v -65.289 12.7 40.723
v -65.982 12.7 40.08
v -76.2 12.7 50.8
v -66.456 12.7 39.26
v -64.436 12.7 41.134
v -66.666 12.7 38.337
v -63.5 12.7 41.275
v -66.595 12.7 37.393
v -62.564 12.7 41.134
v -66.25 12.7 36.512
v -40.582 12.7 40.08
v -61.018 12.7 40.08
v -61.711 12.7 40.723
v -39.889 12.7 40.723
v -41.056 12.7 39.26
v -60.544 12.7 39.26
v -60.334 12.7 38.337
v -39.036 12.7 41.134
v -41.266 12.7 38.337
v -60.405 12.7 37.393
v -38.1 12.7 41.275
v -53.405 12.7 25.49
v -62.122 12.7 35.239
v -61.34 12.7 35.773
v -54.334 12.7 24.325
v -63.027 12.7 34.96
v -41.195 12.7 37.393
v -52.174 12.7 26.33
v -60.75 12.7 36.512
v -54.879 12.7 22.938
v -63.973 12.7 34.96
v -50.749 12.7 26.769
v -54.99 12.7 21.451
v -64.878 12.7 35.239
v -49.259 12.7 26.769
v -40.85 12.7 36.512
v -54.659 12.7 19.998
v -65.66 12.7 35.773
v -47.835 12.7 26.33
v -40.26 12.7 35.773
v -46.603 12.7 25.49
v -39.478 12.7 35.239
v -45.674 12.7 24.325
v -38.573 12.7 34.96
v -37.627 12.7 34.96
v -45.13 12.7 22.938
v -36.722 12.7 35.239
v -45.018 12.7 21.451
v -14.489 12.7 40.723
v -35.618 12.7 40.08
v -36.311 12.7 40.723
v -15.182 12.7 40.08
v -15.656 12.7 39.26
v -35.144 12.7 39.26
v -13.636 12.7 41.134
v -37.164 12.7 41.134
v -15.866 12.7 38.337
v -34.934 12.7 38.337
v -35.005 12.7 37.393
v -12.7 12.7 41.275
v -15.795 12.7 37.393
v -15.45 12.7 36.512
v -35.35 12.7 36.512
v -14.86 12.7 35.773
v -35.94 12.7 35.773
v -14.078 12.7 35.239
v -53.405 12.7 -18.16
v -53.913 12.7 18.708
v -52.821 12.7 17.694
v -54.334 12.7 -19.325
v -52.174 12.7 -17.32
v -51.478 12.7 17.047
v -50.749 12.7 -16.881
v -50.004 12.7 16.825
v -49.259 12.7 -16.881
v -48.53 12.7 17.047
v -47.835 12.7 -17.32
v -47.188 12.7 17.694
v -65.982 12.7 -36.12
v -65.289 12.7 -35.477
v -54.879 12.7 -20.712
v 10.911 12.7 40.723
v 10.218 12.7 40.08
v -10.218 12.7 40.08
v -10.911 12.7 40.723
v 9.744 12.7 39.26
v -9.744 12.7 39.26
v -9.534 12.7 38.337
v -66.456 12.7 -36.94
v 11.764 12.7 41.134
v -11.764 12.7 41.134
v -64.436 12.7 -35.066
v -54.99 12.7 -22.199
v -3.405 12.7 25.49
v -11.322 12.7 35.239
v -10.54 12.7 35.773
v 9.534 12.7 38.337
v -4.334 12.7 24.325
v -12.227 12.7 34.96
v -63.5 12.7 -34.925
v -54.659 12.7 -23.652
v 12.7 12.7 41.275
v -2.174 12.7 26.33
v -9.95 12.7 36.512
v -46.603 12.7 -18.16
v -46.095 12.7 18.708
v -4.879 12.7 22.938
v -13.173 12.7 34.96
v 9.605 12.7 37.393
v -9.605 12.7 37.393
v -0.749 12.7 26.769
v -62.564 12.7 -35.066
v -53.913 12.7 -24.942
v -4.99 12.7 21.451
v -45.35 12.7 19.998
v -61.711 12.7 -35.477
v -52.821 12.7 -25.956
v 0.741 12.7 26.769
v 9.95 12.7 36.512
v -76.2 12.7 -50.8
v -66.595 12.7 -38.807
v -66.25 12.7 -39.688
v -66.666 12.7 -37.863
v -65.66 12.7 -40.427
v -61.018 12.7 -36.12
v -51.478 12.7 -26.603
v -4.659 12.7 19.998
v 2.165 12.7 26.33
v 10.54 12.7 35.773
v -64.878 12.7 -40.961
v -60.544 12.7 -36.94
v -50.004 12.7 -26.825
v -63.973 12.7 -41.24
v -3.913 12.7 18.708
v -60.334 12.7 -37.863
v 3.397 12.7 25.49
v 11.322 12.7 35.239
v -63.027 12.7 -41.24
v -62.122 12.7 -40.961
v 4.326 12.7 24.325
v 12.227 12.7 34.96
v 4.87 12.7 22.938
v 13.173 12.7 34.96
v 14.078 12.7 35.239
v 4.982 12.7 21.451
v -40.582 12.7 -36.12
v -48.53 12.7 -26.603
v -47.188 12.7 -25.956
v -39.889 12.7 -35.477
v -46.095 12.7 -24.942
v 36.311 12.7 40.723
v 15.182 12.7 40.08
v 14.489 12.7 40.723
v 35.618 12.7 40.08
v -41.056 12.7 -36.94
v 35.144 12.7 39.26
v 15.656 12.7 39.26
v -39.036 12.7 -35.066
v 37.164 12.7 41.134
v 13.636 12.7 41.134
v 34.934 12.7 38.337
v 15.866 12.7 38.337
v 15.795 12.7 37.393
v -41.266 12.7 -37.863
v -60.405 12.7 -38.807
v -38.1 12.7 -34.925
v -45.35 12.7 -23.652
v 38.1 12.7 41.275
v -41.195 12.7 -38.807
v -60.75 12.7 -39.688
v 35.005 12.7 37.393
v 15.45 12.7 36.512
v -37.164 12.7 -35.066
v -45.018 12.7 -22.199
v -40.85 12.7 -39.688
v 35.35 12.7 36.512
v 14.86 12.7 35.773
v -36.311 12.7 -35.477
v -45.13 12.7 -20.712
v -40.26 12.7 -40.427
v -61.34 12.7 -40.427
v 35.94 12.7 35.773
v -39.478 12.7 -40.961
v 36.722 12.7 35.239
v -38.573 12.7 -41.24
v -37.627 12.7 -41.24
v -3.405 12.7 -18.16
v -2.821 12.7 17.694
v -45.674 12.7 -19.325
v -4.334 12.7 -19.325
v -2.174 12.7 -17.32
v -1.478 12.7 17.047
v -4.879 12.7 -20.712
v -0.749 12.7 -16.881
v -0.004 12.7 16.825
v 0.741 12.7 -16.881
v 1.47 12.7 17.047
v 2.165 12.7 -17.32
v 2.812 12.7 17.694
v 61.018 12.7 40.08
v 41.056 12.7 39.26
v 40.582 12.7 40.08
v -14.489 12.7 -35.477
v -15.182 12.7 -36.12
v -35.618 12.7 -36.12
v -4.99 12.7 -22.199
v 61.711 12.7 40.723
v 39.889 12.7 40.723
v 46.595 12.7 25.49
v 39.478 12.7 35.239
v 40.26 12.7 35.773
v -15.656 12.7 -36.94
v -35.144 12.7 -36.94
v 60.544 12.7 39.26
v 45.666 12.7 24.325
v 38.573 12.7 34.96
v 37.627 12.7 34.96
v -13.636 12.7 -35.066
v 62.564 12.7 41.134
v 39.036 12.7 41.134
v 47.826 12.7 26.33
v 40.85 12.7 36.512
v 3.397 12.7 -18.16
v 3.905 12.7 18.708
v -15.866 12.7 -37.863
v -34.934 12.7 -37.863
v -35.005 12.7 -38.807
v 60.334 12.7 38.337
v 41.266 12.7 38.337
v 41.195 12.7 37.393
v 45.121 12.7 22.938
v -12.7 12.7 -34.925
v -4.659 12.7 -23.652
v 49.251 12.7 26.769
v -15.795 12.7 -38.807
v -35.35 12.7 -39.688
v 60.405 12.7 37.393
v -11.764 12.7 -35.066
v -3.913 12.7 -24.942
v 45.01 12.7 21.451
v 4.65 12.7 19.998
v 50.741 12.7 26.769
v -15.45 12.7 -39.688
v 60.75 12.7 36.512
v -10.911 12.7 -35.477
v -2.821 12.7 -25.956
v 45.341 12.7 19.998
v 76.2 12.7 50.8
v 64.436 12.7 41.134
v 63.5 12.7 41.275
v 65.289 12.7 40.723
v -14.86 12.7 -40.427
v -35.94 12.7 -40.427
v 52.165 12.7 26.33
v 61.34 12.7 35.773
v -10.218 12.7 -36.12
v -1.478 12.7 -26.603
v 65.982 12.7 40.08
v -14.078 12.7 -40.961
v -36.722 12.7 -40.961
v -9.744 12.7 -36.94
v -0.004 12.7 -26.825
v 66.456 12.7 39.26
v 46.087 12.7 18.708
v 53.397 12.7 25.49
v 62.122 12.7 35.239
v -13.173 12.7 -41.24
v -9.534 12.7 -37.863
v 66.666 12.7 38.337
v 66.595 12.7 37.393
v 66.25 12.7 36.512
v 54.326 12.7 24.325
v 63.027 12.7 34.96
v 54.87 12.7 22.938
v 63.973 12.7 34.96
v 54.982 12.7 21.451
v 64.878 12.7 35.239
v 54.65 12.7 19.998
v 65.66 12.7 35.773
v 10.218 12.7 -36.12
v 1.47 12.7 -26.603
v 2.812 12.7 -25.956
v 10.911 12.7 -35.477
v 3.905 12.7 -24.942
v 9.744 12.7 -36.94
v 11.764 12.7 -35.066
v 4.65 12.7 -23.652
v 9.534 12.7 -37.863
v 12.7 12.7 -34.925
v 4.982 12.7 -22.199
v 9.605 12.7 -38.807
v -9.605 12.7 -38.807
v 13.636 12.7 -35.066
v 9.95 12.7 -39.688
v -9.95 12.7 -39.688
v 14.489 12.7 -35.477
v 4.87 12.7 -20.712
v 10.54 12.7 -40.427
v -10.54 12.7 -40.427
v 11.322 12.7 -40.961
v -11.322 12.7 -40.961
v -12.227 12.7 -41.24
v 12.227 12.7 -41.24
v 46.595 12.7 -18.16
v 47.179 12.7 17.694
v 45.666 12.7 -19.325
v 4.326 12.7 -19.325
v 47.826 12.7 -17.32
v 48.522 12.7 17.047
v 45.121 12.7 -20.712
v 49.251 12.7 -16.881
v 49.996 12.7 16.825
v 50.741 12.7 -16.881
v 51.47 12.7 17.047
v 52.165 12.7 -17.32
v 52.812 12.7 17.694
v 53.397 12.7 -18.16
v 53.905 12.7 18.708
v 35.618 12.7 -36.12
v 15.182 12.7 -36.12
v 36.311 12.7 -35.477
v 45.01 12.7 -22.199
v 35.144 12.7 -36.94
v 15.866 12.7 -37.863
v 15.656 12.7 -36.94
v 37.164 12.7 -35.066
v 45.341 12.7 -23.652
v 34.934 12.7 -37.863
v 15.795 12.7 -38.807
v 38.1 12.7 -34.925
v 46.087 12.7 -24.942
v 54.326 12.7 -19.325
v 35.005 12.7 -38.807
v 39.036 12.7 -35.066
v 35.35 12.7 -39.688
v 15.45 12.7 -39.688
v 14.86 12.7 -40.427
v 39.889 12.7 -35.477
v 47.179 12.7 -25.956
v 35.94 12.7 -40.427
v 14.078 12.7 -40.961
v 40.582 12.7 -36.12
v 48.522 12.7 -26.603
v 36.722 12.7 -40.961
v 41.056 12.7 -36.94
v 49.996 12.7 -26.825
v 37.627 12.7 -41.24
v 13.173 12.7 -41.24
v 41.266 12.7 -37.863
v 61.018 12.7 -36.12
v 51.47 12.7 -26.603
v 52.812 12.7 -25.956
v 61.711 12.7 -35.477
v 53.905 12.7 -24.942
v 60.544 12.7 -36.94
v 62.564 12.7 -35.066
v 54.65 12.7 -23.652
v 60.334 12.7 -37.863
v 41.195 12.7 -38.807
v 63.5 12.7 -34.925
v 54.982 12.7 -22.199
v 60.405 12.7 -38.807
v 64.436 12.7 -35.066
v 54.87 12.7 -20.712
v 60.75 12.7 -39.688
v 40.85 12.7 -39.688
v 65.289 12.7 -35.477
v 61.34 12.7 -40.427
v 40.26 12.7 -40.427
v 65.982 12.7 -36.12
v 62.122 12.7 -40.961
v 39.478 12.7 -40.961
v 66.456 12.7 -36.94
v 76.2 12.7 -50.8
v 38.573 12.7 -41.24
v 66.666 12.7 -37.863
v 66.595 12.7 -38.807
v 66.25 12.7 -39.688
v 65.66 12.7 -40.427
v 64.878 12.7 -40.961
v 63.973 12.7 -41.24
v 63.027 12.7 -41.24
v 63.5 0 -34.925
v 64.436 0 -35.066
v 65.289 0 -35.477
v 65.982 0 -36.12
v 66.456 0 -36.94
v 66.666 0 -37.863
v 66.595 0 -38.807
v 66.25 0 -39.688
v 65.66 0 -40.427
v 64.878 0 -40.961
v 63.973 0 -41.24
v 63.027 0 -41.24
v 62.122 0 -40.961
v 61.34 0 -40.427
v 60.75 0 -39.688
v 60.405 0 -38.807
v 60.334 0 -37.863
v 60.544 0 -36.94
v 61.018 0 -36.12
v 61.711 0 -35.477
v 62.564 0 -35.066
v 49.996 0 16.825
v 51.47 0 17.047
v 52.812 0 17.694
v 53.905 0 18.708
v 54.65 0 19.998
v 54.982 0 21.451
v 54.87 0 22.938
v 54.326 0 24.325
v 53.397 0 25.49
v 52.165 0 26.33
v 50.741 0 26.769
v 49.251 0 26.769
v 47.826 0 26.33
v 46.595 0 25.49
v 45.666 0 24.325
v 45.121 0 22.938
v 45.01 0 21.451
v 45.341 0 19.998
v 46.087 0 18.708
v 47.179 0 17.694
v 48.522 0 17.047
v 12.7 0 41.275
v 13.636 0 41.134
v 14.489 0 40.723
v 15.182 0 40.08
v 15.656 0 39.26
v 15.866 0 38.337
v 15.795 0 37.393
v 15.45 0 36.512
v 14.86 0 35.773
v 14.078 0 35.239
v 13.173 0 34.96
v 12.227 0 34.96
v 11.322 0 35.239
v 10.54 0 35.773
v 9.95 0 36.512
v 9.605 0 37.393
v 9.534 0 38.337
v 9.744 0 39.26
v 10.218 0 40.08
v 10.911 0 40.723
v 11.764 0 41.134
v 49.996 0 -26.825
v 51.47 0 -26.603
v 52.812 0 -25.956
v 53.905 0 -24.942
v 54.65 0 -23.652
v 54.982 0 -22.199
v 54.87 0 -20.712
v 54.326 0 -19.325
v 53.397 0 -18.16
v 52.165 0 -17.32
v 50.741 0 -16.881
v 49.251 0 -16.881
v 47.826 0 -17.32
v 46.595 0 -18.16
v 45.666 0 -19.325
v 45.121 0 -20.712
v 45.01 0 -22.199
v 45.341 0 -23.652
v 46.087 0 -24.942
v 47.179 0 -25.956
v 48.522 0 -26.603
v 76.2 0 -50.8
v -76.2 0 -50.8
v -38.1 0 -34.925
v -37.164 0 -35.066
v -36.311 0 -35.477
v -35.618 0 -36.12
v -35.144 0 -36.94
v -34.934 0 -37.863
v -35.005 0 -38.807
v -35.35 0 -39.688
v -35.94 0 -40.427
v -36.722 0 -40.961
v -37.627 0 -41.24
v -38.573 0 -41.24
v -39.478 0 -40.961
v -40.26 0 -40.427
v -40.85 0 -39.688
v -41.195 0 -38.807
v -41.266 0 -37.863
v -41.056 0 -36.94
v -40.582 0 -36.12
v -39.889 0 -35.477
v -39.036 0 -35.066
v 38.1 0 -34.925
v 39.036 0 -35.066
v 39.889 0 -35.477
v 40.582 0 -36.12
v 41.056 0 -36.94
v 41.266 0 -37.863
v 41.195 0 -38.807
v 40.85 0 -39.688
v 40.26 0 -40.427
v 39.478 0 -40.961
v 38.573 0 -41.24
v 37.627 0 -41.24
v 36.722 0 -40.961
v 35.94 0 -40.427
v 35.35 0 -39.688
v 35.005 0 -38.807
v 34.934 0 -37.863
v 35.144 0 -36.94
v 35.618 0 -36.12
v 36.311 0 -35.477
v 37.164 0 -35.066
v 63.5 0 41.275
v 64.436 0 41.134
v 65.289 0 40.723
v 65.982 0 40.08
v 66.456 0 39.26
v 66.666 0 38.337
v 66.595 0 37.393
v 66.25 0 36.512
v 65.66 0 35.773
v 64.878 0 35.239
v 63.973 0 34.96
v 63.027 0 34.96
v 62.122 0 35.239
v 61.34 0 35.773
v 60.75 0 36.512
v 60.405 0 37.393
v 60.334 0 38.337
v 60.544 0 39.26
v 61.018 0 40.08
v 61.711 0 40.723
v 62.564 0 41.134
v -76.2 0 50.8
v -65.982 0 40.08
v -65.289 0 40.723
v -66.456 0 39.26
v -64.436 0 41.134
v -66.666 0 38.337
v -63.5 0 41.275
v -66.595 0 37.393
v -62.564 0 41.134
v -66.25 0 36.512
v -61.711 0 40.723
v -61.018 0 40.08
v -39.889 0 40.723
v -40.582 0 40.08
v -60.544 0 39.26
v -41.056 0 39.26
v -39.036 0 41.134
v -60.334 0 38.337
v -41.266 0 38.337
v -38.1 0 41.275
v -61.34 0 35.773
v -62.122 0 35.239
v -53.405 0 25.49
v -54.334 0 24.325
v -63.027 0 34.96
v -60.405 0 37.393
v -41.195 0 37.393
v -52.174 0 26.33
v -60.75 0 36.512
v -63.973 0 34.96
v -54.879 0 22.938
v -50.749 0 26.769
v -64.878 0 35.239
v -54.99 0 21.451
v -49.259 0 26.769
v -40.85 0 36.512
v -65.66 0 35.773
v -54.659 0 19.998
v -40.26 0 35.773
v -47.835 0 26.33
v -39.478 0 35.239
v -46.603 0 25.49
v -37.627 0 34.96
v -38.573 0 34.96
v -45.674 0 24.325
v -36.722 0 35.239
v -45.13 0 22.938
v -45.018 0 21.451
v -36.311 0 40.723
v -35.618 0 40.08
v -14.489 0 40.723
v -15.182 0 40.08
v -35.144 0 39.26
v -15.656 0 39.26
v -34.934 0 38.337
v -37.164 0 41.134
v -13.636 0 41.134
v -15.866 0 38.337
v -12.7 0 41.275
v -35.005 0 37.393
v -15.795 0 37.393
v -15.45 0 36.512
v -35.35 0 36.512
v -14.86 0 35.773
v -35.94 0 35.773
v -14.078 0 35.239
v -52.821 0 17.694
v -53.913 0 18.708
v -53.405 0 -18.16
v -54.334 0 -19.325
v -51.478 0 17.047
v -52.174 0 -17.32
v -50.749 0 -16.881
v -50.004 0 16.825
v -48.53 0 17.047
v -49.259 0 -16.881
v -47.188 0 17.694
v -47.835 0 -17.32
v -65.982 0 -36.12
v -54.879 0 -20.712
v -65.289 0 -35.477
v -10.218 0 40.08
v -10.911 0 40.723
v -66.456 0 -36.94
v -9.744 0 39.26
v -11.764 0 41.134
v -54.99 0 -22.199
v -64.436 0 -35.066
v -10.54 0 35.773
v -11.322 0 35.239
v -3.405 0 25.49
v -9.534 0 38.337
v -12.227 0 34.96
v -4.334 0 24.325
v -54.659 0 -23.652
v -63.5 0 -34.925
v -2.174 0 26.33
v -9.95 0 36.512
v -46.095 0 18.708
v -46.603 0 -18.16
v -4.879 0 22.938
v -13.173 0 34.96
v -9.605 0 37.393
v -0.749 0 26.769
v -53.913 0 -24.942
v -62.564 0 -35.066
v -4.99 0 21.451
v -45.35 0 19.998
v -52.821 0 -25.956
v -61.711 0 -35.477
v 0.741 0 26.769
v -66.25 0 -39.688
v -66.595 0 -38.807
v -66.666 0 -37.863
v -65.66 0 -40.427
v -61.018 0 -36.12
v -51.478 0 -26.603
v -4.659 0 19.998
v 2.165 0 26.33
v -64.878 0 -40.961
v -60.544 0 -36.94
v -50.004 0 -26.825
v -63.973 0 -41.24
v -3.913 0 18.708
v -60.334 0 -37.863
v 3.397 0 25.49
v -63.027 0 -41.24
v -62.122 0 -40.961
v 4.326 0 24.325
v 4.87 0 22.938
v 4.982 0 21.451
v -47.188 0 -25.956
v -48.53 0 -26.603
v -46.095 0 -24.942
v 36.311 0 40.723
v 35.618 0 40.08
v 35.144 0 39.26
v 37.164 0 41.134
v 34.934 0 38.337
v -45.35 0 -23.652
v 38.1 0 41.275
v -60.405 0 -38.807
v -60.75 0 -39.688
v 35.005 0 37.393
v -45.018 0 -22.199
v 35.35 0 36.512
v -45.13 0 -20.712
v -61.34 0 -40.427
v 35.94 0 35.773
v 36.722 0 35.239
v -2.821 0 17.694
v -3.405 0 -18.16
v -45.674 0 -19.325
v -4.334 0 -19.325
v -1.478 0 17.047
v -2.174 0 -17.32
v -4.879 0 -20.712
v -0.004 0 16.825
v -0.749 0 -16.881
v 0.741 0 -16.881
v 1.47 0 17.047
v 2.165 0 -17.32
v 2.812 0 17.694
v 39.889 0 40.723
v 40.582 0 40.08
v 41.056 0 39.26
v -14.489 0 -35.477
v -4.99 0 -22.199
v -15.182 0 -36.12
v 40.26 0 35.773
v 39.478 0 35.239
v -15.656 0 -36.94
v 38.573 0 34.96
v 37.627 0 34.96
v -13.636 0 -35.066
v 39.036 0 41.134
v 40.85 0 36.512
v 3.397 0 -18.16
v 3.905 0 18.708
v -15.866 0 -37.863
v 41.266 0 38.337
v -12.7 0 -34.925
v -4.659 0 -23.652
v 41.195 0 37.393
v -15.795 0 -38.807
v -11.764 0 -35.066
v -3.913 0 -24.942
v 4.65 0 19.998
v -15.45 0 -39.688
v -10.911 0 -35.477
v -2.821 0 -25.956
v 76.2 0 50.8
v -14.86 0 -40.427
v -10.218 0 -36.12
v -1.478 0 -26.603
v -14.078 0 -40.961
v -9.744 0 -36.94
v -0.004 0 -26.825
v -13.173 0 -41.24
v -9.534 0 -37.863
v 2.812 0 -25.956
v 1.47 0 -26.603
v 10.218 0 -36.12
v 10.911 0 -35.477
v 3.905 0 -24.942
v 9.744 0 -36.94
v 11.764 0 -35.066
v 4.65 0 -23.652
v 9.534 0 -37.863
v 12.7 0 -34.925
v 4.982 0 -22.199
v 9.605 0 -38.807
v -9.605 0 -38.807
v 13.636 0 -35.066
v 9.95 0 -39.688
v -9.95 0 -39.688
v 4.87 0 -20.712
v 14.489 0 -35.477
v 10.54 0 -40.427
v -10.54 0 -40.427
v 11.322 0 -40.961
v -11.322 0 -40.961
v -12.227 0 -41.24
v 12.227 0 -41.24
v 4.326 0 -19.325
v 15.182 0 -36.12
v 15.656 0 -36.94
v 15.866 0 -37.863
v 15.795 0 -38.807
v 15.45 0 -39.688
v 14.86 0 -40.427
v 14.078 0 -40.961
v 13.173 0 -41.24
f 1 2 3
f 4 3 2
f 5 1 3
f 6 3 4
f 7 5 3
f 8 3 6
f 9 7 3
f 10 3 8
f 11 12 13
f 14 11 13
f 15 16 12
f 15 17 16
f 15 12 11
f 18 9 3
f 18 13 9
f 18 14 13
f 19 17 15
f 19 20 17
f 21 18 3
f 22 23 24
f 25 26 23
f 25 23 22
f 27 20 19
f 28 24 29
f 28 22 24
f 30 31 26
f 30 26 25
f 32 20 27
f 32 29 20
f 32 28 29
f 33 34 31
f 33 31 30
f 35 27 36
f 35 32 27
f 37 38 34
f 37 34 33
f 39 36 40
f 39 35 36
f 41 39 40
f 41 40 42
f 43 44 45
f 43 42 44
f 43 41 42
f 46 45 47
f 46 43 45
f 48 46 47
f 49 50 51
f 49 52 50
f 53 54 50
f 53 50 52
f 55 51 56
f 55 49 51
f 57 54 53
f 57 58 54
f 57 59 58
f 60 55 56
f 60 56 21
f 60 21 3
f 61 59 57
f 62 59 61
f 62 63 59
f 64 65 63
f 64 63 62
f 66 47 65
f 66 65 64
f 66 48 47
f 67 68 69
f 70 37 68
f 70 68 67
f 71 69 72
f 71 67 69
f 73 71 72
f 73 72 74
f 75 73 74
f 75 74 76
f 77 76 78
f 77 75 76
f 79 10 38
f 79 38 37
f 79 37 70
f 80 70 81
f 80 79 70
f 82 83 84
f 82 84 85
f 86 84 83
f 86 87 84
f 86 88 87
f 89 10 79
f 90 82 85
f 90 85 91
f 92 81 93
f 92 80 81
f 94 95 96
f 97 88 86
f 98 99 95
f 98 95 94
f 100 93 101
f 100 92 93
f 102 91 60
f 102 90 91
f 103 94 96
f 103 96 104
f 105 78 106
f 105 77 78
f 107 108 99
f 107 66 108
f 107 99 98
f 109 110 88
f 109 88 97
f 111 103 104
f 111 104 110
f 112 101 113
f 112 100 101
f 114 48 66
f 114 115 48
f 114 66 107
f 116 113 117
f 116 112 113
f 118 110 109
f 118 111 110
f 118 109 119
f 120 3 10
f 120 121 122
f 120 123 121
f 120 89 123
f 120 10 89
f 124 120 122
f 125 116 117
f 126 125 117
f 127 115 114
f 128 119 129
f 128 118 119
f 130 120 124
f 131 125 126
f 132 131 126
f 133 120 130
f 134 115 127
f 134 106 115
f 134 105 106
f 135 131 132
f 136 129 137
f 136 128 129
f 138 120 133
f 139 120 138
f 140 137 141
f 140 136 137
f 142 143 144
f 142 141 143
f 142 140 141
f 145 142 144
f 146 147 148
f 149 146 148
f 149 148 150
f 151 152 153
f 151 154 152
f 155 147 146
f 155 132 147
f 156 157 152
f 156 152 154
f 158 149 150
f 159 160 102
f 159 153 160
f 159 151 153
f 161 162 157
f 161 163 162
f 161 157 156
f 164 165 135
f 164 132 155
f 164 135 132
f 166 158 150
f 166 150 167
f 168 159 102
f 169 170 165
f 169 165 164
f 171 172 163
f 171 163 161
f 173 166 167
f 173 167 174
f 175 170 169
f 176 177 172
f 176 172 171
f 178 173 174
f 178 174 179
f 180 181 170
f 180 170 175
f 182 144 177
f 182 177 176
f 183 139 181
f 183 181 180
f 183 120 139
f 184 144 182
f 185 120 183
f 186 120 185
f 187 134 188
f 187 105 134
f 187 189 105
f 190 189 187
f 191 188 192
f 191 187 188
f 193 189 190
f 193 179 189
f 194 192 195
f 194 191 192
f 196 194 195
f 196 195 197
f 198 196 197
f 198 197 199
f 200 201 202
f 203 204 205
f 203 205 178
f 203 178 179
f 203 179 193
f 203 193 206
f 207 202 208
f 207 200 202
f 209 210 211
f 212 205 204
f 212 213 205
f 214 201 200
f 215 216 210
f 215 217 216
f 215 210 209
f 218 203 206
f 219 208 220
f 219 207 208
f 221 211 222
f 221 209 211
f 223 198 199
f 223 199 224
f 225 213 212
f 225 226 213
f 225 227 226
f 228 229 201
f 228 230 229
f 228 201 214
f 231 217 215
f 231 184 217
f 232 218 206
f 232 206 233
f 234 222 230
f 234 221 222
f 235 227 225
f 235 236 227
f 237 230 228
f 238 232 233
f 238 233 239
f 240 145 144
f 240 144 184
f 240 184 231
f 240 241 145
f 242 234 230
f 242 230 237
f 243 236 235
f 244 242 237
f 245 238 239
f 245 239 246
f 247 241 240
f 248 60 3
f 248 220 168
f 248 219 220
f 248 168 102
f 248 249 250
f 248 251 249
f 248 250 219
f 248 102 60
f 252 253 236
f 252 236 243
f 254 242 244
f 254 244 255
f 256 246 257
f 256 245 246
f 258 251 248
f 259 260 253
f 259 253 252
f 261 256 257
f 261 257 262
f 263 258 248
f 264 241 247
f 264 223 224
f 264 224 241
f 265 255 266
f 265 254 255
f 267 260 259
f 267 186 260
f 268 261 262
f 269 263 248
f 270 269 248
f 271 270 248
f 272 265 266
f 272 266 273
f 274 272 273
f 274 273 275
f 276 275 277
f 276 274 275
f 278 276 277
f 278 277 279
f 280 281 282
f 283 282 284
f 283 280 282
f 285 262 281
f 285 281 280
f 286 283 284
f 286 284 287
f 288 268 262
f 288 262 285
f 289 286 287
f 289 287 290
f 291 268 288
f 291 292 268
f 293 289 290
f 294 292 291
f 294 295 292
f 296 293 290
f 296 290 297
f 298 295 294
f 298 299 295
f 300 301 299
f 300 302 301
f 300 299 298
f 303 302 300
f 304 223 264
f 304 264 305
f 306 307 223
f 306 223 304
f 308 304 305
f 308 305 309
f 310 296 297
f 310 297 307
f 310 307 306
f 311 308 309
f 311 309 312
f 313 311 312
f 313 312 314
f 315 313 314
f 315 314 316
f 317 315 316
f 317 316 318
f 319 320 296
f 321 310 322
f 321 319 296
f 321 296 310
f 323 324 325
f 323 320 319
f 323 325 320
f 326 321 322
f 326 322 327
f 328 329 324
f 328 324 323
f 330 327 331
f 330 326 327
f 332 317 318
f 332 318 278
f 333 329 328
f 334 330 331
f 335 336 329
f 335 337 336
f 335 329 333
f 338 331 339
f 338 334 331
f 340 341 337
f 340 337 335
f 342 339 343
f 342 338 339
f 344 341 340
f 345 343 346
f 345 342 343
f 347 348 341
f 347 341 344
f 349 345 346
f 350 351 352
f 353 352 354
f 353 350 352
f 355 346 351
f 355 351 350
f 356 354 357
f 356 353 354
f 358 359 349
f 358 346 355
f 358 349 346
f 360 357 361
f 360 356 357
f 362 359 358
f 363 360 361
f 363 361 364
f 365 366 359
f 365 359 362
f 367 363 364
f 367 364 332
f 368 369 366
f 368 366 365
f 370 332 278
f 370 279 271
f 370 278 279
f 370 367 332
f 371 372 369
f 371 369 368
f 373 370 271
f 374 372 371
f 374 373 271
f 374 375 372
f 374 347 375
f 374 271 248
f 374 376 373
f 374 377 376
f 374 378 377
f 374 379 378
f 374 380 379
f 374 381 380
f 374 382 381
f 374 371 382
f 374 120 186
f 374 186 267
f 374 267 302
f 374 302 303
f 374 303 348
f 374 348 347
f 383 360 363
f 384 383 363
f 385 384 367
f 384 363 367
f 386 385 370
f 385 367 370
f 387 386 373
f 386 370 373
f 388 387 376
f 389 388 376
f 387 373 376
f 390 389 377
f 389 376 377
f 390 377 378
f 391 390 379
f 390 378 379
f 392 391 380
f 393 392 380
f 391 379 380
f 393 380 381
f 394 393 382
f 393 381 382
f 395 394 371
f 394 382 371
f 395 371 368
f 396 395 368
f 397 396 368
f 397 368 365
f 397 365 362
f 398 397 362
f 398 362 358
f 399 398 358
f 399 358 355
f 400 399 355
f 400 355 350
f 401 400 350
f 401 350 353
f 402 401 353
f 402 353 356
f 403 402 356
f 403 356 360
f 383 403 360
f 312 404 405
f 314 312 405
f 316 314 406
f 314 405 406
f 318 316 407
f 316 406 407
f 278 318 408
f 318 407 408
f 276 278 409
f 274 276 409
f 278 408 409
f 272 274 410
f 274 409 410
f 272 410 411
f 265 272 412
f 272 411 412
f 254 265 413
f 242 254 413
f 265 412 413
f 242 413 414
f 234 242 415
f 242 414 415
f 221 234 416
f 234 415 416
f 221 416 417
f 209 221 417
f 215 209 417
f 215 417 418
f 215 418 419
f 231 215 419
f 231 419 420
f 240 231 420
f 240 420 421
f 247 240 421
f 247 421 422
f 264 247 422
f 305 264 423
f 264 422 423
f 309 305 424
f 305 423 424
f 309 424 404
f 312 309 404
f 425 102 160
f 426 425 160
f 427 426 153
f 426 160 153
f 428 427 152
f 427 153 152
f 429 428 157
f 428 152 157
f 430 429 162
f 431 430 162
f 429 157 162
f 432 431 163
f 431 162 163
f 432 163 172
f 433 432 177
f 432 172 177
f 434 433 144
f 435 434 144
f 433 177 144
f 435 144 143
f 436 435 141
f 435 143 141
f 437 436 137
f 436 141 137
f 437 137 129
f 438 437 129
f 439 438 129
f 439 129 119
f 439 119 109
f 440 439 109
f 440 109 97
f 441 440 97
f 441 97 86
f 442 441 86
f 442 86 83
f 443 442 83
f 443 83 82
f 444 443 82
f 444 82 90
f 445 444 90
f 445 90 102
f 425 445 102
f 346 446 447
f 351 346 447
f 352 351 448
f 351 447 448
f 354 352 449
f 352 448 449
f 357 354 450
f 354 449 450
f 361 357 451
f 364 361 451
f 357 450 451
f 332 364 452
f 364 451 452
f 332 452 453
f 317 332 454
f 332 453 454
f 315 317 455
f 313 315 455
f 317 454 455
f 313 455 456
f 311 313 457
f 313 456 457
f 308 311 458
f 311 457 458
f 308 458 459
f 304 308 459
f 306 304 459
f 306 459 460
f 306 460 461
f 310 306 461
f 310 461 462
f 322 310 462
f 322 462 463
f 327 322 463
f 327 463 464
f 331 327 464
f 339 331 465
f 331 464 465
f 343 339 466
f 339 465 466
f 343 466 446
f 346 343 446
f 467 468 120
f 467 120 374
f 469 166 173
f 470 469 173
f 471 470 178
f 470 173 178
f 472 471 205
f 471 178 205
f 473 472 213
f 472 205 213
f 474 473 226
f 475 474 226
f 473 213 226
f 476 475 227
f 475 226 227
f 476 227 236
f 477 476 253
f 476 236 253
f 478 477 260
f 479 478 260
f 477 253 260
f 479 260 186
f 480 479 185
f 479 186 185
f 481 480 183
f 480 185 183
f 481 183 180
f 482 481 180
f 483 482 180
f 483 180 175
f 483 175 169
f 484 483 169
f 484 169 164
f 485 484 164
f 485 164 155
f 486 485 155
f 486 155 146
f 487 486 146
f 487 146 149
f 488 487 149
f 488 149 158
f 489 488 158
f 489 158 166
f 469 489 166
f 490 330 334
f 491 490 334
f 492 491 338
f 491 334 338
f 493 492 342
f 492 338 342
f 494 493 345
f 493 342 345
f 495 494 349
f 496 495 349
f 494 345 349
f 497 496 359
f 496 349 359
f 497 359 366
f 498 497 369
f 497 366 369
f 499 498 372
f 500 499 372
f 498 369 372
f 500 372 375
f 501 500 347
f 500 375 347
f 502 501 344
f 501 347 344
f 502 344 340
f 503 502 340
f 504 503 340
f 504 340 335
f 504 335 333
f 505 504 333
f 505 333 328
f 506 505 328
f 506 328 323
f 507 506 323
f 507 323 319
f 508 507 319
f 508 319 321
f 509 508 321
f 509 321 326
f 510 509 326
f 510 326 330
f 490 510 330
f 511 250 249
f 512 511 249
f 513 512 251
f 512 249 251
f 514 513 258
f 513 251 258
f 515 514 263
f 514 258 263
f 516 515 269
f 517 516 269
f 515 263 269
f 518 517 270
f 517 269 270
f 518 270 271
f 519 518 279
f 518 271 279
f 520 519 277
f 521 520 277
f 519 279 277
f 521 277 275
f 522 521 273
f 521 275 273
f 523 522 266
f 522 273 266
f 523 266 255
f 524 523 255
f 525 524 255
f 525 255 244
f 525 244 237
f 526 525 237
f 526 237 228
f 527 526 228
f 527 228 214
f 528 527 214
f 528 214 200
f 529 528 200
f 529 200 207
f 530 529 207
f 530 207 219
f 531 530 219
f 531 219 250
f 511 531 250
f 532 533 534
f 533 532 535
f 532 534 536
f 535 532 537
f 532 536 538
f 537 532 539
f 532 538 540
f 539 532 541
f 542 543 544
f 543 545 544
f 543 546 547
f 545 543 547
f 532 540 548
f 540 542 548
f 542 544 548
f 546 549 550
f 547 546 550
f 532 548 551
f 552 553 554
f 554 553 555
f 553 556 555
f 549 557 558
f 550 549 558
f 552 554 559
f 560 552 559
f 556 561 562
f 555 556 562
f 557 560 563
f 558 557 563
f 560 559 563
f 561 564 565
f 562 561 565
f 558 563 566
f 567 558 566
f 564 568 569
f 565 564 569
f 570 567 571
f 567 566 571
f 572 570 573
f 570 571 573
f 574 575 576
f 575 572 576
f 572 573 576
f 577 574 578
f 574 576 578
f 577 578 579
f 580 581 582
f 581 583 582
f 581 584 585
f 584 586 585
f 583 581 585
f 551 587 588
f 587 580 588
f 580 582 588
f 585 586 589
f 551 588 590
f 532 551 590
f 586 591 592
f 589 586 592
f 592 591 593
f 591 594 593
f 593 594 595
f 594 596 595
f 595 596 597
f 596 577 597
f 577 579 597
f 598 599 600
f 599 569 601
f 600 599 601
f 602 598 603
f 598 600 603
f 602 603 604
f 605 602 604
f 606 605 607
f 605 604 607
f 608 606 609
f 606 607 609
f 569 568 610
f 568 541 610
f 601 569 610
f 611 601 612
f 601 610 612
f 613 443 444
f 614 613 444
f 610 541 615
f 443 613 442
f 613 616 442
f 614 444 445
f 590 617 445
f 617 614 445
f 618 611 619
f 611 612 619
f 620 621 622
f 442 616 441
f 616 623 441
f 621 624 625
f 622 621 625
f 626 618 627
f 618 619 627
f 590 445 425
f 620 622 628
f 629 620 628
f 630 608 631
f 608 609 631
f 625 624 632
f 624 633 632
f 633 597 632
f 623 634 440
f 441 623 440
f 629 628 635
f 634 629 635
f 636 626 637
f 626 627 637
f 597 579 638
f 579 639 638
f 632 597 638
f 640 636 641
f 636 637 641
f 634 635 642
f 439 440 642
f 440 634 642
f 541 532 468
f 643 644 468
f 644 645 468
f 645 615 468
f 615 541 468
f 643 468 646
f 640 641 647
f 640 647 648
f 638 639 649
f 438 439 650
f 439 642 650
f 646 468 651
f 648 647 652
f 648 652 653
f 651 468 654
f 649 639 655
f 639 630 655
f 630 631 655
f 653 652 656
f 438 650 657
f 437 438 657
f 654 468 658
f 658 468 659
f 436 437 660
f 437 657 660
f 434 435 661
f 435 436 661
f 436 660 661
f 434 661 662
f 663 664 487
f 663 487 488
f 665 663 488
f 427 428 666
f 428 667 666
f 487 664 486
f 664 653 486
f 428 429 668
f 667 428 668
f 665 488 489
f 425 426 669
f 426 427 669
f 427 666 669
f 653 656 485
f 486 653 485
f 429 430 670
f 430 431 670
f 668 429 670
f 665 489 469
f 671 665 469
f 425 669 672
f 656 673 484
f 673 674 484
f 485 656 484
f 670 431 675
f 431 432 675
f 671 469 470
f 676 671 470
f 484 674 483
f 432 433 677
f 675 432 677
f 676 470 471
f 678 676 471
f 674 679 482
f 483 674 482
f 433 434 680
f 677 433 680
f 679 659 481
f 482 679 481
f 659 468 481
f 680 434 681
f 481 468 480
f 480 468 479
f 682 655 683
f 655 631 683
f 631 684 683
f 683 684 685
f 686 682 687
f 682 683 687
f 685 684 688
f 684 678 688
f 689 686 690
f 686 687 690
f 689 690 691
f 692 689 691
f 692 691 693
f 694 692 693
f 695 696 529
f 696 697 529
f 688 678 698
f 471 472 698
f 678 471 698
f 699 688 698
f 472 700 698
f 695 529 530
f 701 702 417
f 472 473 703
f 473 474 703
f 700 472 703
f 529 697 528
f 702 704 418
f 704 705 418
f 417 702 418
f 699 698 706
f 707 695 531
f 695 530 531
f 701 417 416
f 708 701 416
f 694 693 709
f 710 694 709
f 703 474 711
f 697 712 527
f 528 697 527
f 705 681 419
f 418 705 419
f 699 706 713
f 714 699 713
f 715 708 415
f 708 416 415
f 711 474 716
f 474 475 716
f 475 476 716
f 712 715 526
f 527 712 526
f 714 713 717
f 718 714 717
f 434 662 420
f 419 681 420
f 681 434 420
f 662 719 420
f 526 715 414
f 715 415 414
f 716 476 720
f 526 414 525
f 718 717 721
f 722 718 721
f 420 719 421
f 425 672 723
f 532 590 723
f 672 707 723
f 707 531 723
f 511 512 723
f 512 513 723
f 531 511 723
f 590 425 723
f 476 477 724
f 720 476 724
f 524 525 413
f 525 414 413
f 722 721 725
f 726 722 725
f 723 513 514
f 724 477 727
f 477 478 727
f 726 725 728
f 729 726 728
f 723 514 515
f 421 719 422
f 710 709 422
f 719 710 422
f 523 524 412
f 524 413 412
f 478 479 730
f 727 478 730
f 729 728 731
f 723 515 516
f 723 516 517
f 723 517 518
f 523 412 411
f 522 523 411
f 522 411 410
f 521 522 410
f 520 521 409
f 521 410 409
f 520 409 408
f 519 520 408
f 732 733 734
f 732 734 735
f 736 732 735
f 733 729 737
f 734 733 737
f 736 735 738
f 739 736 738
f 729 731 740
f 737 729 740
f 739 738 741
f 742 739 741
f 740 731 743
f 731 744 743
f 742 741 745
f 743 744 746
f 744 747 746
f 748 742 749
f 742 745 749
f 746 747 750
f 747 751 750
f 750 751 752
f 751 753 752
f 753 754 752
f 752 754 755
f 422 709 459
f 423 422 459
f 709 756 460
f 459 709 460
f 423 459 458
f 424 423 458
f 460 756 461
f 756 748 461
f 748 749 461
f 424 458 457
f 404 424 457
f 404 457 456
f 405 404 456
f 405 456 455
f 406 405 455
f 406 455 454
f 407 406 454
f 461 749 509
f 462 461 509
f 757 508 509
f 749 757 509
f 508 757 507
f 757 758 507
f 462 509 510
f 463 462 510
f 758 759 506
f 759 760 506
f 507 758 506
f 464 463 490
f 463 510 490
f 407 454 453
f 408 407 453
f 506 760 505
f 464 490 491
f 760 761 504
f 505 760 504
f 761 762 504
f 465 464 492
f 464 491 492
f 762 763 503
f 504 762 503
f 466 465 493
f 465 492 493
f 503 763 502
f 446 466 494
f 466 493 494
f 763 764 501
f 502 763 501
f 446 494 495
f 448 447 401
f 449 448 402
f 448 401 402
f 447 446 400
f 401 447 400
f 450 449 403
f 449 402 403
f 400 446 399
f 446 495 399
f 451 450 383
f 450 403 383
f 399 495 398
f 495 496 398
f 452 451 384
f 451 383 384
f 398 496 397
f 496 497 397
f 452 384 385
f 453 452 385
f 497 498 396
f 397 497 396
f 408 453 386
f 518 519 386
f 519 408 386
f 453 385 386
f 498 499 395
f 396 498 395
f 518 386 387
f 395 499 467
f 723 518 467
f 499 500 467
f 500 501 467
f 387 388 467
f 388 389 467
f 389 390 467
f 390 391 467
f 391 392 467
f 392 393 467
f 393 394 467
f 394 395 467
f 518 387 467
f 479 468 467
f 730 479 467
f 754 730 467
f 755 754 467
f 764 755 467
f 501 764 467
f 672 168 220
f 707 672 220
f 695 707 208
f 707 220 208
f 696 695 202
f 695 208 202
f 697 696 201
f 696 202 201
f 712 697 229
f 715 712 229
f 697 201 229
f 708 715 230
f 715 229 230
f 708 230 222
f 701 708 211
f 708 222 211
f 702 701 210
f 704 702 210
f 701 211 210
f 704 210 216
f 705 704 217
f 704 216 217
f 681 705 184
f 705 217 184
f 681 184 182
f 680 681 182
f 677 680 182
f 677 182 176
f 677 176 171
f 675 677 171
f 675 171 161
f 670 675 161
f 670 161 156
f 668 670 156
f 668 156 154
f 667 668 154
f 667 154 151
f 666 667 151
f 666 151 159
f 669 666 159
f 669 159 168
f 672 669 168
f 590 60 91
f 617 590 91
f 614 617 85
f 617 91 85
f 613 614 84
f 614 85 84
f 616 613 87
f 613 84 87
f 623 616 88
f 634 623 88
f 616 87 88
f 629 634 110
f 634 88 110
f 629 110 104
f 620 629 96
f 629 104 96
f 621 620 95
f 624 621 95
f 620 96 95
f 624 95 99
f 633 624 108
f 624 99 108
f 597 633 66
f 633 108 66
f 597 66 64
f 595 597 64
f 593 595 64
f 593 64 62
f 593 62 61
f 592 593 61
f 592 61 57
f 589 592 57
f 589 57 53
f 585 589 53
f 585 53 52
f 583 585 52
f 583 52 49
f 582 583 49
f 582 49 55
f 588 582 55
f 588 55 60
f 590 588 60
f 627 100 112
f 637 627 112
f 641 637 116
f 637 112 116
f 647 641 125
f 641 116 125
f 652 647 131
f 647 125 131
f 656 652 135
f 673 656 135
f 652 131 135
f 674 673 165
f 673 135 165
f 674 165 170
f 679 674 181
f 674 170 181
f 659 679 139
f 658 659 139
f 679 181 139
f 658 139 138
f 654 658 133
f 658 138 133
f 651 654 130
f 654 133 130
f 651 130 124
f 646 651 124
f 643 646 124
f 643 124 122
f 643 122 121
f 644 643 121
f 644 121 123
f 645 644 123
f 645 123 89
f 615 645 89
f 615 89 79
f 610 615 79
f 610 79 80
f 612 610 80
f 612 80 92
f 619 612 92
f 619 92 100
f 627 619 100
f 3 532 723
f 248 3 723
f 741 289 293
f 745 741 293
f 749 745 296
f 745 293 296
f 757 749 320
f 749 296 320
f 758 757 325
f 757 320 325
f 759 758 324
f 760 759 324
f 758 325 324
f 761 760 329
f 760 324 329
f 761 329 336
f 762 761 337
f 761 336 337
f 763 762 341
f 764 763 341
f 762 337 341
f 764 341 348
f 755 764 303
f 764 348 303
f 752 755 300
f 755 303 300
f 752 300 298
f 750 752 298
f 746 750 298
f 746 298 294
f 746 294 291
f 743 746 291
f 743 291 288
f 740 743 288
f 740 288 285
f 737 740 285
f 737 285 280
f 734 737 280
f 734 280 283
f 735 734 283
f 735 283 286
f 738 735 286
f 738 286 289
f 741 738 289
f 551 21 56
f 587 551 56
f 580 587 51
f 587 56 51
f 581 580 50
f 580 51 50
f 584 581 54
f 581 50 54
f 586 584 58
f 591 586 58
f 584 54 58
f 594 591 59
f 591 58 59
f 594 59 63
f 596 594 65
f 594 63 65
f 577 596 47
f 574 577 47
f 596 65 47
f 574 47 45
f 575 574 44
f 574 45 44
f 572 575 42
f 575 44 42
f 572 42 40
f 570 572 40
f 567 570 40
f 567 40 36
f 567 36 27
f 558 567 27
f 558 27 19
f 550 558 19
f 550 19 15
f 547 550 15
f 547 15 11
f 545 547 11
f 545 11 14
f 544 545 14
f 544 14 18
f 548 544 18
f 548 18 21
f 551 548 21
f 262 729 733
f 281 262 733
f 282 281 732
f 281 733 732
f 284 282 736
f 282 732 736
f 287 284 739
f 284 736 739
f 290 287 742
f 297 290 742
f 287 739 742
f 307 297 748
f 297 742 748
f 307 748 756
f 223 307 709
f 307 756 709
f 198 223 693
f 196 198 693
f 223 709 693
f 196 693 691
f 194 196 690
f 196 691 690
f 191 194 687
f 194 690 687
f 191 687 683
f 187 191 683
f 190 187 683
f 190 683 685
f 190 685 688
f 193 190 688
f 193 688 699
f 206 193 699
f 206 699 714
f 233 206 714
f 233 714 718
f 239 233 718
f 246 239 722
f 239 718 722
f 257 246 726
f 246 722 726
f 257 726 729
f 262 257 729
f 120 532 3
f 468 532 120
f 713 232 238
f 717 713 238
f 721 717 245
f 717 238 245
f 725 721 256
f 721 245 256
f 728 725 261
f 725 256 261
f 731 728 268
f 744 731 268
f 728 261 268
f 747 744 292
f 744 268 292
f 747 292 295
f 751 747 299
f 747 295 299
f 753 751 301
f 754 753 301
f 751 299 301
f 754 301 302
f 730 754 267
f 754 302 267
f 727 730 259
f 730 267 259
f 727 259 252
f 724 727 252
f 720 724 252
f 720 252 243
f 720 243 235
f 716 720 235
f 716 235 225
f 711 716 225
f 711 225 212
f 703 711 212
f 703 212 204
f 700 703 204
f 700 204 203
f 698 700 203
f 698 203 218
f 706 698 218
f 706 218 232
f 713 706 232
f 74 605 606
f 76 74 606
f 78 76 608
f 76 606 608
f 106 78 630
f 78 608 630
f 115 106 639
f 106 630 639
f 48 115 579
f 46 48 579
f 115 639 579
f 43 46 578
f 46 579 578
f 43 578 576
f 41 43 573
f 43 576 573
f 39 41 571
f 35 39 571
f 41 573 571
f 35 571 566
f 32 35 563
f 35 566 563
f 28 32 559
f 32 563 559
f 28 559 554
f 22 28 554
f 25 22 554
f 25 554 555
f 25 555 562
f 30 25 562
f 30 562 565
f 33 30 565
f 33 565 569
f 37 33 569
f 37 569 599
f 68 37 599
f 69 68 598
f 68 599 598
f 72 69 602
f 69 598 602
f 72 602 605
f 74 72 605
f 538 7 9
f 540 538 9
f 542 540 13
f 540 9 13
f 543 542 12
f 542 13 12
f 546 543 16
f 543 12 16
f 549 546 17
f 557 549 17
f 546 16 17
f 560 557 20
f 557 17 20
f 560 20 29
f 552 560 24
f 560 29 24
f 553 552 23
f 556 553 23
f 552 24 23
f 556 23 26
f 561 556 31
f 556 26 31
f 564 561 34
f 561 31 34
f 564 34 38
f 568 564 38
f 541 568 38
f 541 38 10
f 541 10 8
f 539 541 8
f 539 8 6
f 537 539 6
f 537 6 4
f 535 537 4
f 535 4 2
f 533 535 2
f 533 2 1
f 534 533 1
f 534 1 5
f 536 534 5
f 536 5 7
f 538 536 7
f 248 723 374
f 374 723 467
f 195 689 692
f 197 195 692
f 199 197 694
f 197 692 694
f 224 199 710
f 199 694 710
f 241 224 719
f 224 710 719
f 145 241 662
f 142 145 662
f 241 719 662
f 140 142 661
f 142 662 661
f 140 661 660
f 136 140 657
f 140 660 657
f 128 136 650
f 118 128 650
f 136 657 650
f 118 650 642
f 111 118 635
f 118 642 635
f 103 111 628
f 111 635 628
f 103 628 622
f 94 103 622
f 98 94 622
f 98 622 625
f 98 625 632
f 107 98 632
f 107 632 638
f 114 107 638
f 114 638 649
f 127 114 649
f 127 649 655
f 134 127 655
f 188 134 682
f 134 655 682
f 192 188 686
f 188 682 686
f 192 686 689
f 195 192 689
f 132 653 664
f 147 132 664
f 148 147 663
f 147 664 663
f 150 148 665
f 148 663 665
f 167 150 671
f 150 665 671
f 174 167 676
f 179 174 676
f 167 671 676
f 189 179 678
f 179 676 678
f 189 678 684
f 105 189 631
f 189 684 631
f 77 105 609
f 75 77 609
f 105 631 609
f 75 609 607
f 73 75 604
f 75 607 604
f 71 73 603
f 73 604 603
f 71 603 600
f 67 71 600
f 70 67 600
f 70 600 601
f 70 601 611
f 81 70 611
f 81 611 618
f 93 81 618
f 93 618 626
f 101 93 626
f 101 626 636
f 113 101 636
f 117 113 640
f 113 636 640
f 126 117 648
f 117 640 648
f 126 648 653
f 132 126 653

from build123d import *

# Parameters (mm, degrees)
SKETCH1_W           = 152.4
SKETCH1_H           = 101.6
BOSS_EXTRUDE1_DEPTH = 12.7
SKETCH2_R           = 5
CUT_EXTRUDE1_DEPTH  = 12.7
SKETCH3_R           = 3.175
CUT_EXTRUDE2_DEPTH  = 93.457395594


with BuildPart() as part:
    # Sketch1 → Boss-Extrude1 (new body)
    with BuildSketch(Plane(origin=(0, 0, 0), x_dir=(1, 0, 0), z_dir=(0, 1, 0))):
        Rectangle(SKETCH1_W, SKETCH1_H)
    extrude(amount=BOSS_EXTRUDE1_DEPTH)

    # Sketch2 → Cut-Extrude1 (cut)
    with BuildSketch(Plane.XZ):
        with Locations(Location((-50.004206057, 21.825, 0), (0, 0, 270))):
            Circle(SKETCH2_R)
        with Locations(Location((-50.004206057, -21.825, 0), (0, 0, 270))):
            Circle(SKETCH2_R)
        with Locations(Location((-0.004206057, 21.825, 0), (0, 0, 270))):
            Circle(SKETCH2_R)
        with Locations(Location((-0.004206057, -21.825, 0), (0, 0, 270))):
            Circle(SKETCH2_R)
        with Locations(Location((49.995793943, 21.825, 0), (0, 0, 270))):
            Circle(SKETCH2_R)
        with Locations(Location((49.995793943, -21.825, 0), (0, 0, 270))):
            Circle(SKETCH2_R)
    extrude(amount=-CUT_EXTRUDE1_DEPTH, mode=Mode.SUBTRACT)

    # Sketch3 → Cut-Extrude2 (cut, through all)
    with BuildSketch(Plane(origin=(0, 12.7, 0), x_dir=(1, 0, 0), z_dir=(0, 1, 0))):
        with Locations(Location((-63.5, -38.1, 0), (0, 0, 270))):
            Circle(SKETCH3_R)
        with Locations(Location((-38.1, -38.1, 0), (0, 0, 270))):
            Circle(SKETCH3_R)
        with Locations(Location((-12.7, -38.1, 0), (0, 0, 270))):
            Circle(SKETCH3_R)
        with Locations(Location((12.7, -38.1, 0), (0, 0, 270))):
            Circle(SKETCH3_R)
        with Locations(Location((38.1, -38.1, 0), (0, 0, 270))):
            Circle(SKETCH3_R)
        with Locations(Location((63.5, -38.1, 0), (0, 0, 270))):
            Circle(SKETCH3_R)
        with Locations(Location((-38.1, 38.1, 0), (0, 0, 270))):
            Circle(SKETCH3_R)
        with Locations(Location((-12.7, 38.1, 0), (0, 0, 270))):
            Circle(SKETCH3_R)
        with Locations(Location((12.7, 38.1, 0), (0, 0, 270))):
            Circle(SKETCH3_R)
        with Locations(Location((38.1, 38.1, 0), (0, 0, 270))):
            Circle(SKETCH3_R)
        with Locations(Location((63.5, 38.1, 0), (0, 0, 270))):
            Circle(SKETCH3_R)
        with Locations(Location((-63.5, 38.1, 0), (0, 0, 270))):
            Circle(SKETCH3_R)
    extrude(amount=-CUT_EXTRUDE2_DEPTH, mode=Mode.SUBTRACT)


solid = part.part
